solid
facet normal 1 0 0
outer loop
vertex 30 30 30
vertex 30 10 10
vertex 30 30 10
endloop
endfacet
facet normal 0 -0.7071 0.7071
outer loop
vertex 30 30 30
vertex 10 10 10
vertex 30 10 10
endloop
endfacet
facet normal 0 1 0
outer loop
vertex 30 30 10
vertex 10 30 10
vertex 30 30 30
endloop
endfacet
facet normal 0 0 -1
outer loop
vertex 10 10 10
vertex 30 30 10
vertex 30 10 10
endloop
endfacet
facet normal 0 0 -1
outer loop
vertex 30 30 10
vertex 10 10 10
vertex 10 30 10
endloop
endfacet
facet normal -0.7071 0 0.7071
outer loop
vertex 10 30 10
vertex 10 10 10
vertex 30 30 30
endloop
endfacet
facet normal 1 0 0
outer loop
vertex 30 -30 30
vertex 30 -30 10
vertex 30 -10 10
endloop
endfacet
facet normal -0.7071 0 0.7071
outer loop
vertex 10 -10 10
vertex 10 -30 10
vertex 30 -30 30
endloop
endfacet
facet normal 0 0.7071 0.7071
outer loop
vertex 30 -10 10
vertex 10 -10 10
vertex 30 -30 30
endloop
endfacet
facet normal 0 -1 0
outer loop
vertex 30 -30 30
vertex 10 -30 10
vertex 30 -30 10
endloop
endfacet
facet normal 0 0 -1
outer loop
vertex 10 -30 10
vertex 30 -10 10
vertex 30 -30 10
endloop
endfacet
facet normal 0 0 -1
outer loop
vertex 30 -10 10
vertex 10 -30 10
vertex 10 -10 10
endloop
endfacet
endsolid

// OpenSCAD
// Unit of length: Unit.MM
union()
{
   translate(v = [10.0, 10.0, 10.0])
   {
      polyhedron(points = [[20.0, 20.0, 0.0], [20.0, 0.0, 0.0], [20.0, 20.0, 20.0], [0.0, 0.0, 0.0], [0.0, 20.0, 0.0]], faces = [[0, 1, 2], [1, 3, 2], [3, 4, 2], [4, 0, 2], [1, 0, 4], [3, 1, 4]]);
   }
   mirror(v = [0.0, 1.0, 0.0])
   {
      translate(v = [10.0, 10.0, 10.0])
      {
         polyhedron(points = [[20.0, 20.0, 0.0], [20.0, 0.0, 0.0], [20.0, 20.0, 20.0], [0.0, 0.0, 0.0], [0.0, 20.0, 0.0]], faces = [[0, 1, 2], [1, 3, 2], [3, 4, 2], [4, 0, 2], [1, 0, 4], [3, 1, 4]]);
      }
   }
}
